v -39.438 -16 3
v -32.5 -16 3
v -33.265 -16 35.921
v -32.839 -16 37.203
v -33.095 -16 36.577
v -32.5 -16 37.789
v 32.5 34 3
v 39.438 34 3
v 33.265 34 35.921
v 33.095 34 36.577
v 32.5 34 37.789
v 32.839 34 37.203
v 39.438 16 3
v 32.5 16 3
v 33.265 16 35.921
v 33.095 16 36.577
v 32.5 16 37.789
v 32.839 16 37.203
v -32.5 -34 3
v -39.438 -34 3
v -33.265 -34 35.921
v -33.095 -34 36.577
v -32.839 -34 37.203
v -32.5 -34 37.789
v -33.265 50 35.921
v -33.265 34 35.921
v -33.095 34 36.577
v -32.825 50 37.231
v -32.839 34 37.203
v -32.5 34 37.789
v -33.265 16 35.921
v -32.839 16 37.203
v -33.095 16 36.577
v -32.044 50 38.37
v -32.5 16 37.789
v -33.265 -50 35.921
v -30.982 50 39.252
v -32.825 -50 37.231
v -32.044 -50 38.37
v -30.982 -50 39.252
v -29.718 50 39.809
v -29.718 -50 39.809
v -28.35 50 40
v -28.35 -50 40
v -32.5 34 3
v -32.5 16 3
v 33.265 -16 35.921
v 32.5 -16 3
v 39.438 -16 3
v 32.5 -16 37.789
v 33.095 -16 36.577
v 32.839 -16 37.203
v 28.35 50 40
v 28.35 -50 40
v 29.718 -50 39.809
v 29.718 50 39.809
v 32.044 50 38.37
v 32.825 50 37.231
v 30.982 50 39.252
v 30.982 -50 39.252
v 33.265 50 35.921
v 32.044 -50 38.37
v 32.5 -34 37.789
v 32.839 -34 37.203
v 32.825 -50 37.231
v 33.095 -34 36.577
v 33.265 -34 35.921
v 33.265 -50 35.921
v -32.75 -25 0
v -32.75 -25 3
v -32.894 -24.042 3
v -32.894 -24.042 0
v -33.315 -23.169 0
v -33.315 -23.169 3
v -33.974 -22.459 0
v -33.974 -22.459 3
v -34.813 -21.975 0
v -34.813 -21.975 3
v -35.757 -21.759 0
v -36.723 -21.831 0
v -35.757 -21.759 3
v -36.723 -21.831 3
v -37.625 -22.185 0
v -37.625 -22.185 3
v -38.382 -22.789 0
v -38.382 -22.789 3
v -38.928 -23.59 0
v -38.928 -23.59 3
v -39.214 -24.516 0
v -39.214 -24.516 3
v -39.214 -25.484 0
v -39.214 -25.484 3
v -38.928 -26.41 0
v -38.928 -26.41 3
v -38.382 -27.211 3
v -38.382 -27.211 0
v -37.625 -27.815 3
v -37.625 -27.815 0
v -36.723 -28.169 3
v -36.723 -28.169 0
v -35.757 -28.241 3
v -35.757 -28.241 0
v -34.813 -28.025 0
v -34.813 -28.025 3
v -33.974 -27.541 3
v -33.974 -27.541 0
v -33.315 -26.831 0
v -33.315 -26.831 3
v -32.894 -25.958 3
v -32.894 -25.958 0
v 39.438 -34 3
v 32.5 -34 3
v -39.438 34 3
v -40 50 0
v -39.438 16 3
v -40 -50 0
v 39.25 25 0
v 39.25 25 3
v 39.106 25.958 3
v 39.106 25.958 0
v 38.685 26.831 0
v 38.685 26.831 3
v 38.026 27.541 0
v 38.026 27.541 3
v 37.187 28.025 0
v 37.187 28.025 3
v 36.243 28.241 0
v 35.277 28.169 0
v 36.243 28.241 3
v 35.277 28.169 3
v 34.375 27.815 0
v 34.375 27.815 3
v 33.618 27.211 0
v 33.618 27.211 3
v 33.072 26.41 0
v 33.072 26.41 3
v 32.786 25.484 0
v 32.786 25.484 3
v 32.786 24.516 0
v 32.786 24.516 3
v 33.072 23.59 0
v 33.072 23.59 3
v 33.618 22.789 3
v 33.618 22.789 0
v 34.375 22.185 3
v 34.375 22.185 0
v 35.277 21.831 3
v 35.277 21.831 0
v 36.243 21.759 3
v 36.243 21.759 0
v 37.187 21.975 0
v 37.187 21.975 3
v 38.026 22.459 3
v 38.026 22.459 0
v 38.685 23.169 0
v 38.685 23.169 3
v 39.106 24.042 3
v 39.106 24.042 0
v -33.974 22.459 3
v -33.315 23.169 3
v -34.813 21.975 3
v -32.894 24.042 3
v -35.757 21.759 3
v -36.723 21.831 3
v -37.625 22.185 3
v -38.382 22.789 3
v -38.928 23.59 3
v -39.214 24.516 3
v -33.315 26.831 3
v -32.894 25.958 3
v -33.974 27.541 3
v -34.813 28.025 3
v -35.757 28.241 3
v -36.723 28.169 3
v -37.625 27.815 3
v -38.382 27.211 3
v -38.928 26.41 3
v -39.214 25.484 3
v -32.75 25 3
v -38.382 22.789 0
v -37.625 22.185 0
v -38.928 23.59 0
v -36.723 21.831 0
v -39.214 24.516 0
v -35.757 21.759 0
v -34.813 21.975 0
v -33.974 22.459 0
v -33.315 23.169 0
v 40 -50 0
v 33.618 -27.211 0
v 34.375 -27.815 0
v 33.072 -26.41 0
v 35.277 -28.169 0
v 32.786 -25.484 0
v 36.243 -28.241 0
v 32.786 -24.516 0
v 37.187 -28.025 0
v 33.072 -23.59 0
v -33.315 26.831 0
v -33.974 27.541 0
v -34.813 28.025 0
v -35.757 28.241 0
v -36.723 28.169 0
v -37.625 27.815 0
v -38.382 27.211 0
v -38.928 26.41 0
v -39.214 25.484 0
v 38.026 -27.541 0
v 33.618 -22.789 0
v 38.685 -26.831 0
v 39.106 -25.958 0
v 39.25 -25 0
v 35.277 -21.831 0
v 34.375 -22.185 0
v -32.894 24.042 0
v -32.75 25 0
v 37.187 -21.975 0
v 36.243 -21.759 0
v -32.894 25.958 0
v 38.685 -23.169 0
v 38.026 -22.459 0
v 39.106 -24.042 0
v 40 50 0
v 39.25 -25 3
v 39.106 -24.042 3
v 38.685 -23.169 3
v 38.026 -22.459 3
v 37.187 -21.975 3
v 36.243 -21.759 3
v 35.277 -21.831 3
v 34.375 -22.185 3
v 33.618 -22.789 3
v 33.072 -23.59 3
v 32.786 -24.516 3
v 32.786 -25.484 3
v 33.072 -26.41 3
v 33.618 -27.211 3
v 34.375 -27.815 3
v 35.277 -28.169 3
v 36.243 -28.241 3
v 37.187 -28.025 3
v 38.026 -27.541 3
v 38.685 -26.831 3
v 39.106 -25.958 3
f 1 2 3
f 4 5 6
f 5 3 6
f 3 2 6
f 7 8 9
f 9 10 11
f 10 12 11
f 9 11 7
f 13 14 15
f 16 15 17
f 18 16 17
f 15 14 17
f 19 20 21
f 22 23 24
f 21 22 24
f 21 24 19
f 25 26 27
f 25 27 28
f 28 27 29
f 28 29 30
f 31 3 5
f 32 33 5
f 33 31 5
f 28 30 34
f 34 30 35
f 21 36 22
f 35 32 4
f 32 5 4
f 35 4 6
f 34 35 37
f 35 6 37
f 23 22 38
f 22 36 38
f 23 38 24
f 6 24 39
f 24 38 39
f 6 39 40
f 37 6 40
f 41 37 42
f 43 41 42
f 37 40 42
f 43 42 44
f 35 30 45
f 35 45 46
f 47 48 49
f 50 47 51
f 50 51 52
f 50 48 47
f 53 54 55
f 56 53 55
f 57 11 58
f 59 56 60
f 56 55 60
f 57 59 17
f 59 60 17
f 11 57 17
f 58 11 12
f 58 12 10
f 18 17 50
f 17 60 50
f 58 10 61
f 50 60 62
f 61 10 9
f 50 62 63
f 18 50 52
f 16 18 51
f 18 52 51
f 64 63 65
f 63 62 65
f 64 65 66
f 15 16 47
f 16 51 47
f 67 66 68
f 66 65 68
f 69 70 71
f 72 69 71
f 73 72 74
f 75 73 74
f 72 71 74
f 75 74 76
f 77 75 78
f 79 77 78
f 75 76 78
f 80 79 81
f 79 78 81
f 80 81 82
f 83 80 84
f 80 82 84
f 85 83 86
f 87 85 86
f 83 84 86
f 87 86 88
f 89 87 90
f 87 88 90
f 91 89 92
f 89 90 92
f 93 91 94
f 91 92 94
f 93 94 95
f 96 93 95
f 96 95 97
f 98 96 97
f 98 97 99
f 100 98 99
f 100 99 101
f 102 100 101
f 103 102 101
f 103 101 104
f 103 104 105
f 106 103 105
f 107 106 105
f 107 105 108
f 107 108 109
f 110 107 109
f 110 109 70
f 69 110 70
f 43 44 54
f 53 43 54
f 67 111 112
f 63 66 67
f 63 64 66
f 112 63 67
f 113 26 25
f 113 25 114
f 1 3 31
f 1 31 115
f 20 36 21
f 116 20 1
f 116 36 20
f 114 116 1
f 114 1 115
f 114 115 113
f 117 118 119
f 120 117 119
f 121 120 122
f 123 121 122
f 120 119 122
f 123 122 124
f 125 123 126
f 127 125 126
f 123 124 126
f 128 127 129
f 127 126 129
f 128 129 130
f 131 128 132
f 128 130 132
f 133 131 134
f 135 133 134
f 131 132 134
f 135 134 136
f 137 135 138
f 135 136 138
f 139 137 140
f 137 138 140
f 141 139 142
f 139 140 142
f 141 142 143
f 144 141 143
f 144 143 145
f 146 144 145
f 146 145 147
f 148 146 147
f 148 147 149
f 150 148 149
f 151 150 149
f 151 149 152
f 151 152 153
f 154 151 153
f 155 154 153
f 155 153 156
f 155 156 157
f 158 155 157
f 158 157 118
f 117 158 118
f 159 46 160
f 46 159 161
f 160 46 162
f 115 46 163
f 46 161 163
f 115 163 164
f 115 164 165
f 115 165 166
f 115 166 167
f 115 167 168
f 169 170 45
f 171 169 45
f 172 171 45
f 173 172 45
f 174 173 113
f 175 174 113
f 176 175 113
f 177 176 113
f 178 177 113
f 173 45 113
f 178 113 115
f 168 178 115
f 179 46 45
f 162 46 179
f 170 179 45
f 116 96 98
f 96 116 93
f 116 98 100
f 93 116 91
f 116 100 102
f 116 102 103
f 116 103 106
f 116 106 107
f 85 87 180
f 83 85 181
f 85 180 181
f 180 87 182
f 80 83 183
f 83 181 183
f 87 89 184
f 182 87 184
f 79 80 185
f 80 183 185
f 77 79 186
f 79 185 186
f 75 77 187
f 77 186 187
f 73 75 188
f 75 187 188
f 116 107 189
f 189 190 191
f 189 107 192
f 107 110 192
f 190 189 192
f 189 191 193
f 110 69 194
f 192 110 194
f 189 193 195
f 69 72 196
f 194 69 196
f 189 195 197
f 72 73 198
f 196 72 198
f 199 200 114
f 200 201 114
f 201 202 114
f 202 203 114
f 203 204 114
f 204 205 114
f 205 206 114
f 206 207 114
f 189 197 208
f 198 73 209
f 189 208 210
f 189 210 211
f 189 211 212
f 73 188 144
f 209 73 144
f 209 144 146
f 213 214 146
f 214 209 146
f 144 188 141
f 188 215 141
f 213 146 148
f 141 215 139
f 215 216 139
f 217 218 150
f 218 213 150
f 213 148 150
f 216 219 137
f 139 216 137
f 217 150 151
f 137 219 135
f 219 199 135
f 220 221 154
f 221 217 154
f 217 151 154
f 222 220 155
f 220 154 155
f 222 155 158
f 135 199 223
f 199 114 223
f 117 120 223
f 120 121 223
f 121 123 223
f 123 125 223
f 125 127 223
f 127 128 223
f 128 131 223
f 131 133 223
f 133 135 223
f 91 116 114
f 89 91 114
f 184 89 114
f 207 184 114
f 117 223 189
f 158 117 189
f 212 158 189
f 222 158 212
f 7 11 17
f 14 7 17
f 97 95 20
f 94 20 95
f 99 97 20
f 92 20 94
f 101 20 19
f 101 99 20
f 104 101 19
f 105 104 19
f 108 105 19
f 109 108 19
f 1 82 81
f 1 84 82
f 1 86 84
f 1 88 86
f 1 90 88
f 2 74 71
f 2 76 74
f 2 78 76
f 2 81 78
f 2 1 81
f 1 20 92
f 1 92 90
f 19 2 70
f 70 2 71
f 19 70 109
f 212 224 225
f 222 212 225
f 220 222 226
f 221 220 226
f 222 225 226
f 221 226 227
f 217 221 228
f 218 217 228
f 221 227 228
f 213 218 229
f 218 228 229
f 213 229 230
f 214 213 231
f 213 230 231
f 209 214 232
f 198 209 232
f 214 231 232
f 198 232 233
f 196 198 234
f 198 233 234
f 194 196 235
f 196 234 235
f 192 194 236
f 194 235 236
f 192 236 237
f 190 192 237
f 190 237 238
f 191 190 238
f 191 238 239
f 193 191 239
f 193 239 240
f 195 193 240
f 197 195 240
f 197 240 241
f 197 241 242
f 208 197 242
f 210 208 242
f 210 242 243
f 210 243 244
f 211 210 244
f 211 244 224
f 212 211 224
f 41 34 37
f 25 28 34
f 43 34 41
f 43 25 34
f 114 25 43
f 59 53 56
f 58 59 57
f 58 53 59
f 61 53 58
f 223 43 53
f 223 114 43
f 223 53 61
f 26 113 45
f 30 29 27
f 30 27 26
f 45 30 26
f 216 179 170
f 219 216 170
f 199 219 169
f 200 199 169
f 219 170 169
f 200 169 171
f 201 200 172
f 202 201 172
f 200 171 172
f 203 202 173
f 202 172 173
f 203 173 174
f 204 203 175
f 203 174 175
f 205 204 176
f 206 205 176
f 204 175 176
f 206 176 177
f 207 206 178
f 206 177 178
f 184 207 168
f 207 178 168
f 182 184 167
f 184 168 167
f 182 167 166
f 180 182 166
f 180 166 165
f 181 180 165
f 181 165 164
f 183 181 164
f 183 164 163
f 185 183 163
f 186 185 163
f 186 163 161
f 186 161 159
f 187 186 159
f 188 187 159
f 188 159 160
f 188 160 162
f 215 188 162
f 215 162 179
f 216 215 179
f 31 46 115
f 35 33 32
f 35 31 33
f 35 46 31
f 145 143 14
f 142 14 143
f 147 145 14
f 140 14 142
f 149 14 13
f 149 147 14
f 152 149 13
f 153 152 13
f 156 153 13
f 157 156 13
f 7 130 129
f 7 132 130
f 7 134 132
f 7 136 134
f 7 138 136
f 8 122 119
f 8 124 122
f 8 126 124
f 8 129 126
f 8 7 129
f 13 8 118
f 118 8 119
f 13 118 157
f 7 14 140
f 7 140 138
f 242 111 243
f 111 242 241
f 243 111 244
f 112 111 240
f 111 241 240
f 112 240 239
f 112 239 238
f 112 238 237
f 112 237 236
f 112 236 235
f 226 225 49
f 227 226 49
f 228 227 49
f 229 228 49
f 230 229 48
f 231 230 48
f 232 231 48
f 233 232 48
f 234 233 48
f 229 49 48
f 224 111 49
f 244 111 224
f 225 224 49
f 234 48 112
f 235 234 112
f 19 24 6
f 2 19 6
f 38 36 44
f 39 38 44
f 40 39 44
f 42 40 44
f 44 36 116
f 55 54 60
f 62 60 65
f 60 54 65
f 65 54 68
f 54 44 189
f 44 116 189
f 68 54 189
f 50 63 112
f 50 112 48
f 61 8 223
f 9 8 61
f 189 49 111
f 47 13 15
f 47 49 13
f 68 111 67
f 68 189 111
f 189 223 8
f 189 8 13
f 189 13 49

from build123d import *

# Parameters (mm, degrees)
SKETCH_1_W               = 80
SKETCH_1_H               = 100
EXTRUDE_1_DEPTH          = 40
SKETCH_2_OUTSIDE_W       = 108.832
SKETCH_2_OUTSIDE_H       = 68.832
CUT_EXTRUDE_1_DEPTH      = 1
CUT_EXTRUDE_1_DEPTH_BACK = 101
CUT_EXTRUDE_2_DEPTH      = 37
SKETCH_4_R               = 3.25
CUT_EXTRUDE_3_DEPTH      = 37
SKETCH_5_OUTSIDE_W       = 108.832
SKETCH_5_OUTSIDE_H       = 68.832
CUT_EXTRUDE_4_DEPTH      = 100


with BuildPart() as part:
    # 草图1 → 凸台-拉伸1 (new body)
    with BuildSketch(Plane.XY):
        Rectangle(SKETCH_1_W, SKETCH_1_H)
    extrude(amount=EXTRUDE_1_DEPTH)

    # 草图2 outside → 切除-拉伸1 (cut, two sides)
    with BuildSketch(Plane(origin=(0, -50, 0), x_dir=(-1, 0, 0), z_dir=(0, -1, 0))) as cut_extrude_1_sk:
        with Locations((0, -20)):
            Rectangle(SKETCH_2_OUTSIDE_W, SKETCH_2_OUTSIDE_H)
        Polygon((0, -40), (32.5, -40), (40, 0), (-40, 0), (-32.5, -40), align=None, mode=Mode.SUBTRACT)
    extrude(amount=CUT_EXTRUDE_1_DEPTH, mode=Mode.SUBTRACT)
    extrude(cut_extrude_1_sk.sketch, amount=-CUT_EXTRUDE_1_DEPTH_BACK, mode=Mode.SUBTRACT)

    # 草图3 → 切除-拉伸2 (cut)
    with BuildSketch(Plane.XY.offset(40)):
        Polygon((-40, -25), (-40, -34), (-32.5, -34), (-32.5, -16), (-40, -16), align=None)
        Polygon((-40, 16), (-40, 25), (-40, 34), (-32.5, 34), (-32.5, 16), align=None)
        Polygon((40, -16), (40, -25), (40, -34), (32.5, -34), (32.5, -16), align=None)
        Polygon((40, 25), (40, 34), (32.5, 34), (32.5, 16), (40, 16), align=None)
    extrude(amount=-CUT_EXTRUDE_2_DEPTH, mode=Mode.SUBTRACT)

    # 草图4 → 切除-拉伸3 (cut)
    with BuildSketch(Plane.XY.offset(3)):
        with Locations((-36, 25)):
            Circle(SKETCH_4_R)
        with Locations((36, 25)):
            Circle(SKETCH_4_R)
        with Locations((36, -25)):
            Circle(SKETCH_4_R)
        with Locations((-36, -25)):
            Circle(SKETCH_4_R)
    extrude(amount=-CUT_EXTRUDE_3_DEPTH, mode=Mode.SUBTRACT)

    # 草图5 outside → 切除-拉伸4 (cut)
    with BuildSketch(Plane.XZ.offset(50)):
        with Locations((0, 20)):
            Rectangle(SKETCH_5_OUTSIDE_W, SKETCH_5_OUTSIDE_H)
        with BuildLine():
            Line((-28.350368564, 40), (28.350368564, 40))
            ThreePointArc((28.350368564, 40), (31.543547749, 38.847545541), (33.264729498, 35.921442675))
            Line((33.264729498, 35.921442675), (40, 0))
            Line((40, 0), (-40, 0))
            Line((-40, 0), (-33.264729498, 35.921442675))
            ThreePointArc((-33.264729498, 35.921442675), (-31.543547749, 38.847545541), (-28.350368564, 40))
        make_face(mode=Mode.SUBTRACT)
    extrude(amount=-CUT_EXTRUDE_4_DEPTH, mode=Mode.SUBTRACT)


solid = part.part
